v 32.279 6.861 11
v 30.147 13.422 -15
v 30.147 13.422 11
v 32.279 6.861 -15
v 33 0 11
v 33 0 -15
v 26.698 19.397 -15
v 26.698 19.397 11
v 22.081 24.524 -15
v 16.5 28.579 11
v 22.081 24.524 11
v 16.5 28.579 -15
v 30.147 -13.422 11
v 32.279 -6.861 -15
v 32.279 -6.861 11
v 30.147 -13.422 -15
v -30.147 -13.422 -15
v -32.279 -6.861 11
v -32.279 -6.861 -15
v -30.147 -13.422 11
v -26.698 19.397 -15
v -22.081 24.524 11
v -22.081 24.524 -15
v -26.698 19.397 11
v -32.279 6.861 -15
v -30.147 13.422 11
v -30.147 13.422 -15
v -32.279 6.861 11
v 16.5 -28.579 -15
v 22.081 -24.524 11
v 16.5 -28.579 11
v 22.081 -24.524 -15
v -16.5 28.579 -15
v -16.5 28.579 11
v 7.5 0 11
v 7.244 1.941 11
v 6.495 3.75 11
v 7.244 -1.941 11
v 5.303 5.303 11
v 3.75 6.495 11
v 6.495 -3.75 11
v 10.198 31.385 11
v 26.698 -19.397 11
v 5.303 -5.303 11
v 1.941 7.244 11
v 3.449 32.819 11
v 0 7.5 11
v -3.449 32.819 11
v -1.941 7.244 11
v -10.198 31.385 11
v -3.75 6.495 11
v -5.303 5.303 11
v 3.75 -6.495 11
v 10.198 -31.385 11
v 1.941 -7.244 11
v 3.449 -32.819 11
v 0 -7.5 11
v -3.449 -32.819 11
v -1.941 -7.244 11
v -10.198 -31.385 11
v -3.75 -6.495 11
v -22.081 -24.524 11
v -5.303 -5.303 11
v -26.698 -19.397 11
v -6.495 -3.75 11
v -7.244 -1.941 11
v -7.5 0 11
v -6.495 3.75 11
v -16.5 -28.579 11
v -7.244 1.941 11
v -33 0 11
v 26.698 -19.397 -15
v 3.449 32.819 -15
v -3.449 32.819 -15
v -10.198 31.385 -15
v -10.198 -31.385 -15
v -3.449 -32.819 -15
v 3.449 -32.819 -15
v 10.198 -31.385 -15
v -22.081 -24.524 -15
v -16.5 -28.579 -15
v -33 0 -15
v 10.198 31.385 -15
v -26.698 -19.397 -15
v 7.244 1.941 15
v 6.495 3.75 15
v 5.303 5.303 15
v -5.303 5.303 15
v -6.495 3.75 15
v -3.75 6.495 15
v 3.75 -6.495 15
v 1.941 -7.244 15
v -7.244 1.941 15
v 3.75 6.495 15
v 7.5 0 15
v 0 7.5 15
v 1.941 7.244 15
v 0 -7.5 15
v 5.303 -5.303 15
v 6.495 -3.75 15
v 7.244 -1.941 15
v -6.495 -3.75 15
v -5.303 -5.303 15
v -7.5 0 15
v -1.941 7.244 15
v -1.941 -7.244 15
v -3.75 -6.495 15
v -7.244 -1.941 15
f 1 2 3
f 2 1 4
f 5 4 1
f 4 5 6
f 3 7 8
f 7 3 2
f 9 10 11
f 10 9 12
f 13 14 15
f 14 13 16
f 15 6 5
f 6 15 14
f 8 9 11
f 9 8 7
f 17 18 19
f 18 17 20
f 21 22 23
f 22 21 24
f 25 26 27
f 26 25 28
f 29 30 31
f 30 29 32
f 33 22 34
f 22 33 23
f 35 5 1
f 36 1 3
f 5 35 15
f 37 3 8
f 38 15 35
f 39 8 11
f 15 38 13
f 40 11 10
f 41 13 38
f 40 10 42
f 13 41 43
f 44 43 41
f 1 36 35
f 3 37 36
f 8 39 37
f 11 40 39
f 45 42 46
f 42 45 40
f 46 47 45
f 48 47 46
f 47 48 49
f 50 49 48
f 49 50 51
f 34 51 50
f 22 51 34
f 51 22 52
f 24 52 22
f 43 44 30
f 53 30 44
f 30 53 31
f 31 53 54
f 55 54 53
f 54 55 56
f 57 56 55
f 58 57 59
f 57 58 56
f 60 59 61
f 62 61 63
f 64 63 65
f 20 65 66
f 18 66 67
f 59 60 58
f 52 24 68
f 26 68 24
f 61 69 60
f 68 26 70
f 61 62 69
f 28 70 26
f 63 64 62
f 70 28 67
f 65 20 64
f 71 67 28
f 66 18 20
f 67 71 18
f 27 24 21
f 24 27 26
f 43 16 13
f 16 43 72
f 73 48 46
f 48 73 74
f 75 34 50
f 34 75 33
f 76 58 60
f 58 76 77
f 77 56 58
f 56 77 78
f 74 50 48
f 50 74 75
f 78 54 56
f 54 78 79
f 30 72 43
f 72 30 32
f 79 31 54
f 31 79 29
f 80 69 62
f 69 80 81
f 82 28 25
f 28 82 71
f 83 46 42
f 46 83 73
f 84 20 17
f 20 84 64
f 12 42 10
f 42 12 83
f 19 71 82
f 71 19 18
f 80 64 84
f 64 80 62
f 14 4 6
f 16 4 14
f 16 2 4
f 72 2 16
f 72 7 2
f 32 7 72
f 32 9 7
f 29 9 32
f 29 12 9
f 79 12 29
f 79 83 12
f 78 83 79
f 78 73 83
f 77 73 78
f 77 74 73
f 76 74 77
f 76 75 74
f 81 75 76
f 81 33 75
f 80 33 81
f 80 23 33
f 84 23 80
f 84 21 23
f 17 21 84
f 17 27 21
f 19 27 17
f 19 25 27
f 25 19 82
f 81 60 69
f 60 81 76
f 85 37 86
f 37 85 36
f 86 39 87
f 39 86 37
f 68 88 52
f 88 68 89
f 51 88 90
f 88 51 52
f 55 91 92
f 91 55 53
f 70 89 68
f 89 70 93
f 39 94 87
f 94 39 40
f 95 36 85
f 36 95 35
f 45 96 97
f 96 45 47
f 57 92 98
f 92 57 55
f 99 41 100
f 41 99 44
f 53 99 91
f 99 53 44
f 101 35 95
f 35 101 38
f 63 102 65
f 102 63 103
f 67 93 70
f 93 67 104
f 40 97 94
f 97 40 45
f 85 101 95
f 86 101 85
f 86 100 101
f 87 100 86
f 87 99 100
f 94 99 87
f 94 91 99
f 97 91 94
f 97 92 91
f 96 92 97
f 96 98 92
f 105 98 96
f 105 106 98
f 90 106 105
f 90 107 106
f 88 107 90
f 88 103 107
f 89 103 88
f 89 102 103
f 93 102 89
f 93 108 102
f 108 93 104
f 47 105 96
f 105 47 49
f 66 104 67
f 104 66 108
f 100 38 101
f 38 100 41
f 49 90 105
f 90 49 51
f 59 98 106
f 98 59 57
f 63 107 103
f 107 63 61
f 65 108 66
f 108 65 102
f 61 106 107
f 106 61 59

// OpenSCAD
// -*-C-*-
// Model for the "Letry Robot" plastic wheel.
//
// This wheel is available from several different
// online retailers, and fits with the yellow DC
// gearmotor which is modeled in a separate file.
//
// Copyright 2013, Brian Davis
//
// License: LGPL 2.1 or later

// FIXME: rough model, no spokes
module letry_robot_wheel() {
  translate([0, 0, -15])
  rotate([0, 270, 0])
  union() {
  union() {
    rotate([0, 90, 0])
      union() {
        difference() {
	  // tire
	  color("black")
	  cylinder(h=26, r=33);
	  // cutout that provides space for the rim
	  translate([0, 0, -0.1])
	    cylinder(h=26.2, r=26);
	}
	// rim
	cylinder(h=26, r=26);
      }
  }
  // axle attachment
  translate([26, 0, 0])
    rotate([0, 90, 0])
      cylinder(h=4, r=7.5);
  }
}

letry_robot_wheel();
